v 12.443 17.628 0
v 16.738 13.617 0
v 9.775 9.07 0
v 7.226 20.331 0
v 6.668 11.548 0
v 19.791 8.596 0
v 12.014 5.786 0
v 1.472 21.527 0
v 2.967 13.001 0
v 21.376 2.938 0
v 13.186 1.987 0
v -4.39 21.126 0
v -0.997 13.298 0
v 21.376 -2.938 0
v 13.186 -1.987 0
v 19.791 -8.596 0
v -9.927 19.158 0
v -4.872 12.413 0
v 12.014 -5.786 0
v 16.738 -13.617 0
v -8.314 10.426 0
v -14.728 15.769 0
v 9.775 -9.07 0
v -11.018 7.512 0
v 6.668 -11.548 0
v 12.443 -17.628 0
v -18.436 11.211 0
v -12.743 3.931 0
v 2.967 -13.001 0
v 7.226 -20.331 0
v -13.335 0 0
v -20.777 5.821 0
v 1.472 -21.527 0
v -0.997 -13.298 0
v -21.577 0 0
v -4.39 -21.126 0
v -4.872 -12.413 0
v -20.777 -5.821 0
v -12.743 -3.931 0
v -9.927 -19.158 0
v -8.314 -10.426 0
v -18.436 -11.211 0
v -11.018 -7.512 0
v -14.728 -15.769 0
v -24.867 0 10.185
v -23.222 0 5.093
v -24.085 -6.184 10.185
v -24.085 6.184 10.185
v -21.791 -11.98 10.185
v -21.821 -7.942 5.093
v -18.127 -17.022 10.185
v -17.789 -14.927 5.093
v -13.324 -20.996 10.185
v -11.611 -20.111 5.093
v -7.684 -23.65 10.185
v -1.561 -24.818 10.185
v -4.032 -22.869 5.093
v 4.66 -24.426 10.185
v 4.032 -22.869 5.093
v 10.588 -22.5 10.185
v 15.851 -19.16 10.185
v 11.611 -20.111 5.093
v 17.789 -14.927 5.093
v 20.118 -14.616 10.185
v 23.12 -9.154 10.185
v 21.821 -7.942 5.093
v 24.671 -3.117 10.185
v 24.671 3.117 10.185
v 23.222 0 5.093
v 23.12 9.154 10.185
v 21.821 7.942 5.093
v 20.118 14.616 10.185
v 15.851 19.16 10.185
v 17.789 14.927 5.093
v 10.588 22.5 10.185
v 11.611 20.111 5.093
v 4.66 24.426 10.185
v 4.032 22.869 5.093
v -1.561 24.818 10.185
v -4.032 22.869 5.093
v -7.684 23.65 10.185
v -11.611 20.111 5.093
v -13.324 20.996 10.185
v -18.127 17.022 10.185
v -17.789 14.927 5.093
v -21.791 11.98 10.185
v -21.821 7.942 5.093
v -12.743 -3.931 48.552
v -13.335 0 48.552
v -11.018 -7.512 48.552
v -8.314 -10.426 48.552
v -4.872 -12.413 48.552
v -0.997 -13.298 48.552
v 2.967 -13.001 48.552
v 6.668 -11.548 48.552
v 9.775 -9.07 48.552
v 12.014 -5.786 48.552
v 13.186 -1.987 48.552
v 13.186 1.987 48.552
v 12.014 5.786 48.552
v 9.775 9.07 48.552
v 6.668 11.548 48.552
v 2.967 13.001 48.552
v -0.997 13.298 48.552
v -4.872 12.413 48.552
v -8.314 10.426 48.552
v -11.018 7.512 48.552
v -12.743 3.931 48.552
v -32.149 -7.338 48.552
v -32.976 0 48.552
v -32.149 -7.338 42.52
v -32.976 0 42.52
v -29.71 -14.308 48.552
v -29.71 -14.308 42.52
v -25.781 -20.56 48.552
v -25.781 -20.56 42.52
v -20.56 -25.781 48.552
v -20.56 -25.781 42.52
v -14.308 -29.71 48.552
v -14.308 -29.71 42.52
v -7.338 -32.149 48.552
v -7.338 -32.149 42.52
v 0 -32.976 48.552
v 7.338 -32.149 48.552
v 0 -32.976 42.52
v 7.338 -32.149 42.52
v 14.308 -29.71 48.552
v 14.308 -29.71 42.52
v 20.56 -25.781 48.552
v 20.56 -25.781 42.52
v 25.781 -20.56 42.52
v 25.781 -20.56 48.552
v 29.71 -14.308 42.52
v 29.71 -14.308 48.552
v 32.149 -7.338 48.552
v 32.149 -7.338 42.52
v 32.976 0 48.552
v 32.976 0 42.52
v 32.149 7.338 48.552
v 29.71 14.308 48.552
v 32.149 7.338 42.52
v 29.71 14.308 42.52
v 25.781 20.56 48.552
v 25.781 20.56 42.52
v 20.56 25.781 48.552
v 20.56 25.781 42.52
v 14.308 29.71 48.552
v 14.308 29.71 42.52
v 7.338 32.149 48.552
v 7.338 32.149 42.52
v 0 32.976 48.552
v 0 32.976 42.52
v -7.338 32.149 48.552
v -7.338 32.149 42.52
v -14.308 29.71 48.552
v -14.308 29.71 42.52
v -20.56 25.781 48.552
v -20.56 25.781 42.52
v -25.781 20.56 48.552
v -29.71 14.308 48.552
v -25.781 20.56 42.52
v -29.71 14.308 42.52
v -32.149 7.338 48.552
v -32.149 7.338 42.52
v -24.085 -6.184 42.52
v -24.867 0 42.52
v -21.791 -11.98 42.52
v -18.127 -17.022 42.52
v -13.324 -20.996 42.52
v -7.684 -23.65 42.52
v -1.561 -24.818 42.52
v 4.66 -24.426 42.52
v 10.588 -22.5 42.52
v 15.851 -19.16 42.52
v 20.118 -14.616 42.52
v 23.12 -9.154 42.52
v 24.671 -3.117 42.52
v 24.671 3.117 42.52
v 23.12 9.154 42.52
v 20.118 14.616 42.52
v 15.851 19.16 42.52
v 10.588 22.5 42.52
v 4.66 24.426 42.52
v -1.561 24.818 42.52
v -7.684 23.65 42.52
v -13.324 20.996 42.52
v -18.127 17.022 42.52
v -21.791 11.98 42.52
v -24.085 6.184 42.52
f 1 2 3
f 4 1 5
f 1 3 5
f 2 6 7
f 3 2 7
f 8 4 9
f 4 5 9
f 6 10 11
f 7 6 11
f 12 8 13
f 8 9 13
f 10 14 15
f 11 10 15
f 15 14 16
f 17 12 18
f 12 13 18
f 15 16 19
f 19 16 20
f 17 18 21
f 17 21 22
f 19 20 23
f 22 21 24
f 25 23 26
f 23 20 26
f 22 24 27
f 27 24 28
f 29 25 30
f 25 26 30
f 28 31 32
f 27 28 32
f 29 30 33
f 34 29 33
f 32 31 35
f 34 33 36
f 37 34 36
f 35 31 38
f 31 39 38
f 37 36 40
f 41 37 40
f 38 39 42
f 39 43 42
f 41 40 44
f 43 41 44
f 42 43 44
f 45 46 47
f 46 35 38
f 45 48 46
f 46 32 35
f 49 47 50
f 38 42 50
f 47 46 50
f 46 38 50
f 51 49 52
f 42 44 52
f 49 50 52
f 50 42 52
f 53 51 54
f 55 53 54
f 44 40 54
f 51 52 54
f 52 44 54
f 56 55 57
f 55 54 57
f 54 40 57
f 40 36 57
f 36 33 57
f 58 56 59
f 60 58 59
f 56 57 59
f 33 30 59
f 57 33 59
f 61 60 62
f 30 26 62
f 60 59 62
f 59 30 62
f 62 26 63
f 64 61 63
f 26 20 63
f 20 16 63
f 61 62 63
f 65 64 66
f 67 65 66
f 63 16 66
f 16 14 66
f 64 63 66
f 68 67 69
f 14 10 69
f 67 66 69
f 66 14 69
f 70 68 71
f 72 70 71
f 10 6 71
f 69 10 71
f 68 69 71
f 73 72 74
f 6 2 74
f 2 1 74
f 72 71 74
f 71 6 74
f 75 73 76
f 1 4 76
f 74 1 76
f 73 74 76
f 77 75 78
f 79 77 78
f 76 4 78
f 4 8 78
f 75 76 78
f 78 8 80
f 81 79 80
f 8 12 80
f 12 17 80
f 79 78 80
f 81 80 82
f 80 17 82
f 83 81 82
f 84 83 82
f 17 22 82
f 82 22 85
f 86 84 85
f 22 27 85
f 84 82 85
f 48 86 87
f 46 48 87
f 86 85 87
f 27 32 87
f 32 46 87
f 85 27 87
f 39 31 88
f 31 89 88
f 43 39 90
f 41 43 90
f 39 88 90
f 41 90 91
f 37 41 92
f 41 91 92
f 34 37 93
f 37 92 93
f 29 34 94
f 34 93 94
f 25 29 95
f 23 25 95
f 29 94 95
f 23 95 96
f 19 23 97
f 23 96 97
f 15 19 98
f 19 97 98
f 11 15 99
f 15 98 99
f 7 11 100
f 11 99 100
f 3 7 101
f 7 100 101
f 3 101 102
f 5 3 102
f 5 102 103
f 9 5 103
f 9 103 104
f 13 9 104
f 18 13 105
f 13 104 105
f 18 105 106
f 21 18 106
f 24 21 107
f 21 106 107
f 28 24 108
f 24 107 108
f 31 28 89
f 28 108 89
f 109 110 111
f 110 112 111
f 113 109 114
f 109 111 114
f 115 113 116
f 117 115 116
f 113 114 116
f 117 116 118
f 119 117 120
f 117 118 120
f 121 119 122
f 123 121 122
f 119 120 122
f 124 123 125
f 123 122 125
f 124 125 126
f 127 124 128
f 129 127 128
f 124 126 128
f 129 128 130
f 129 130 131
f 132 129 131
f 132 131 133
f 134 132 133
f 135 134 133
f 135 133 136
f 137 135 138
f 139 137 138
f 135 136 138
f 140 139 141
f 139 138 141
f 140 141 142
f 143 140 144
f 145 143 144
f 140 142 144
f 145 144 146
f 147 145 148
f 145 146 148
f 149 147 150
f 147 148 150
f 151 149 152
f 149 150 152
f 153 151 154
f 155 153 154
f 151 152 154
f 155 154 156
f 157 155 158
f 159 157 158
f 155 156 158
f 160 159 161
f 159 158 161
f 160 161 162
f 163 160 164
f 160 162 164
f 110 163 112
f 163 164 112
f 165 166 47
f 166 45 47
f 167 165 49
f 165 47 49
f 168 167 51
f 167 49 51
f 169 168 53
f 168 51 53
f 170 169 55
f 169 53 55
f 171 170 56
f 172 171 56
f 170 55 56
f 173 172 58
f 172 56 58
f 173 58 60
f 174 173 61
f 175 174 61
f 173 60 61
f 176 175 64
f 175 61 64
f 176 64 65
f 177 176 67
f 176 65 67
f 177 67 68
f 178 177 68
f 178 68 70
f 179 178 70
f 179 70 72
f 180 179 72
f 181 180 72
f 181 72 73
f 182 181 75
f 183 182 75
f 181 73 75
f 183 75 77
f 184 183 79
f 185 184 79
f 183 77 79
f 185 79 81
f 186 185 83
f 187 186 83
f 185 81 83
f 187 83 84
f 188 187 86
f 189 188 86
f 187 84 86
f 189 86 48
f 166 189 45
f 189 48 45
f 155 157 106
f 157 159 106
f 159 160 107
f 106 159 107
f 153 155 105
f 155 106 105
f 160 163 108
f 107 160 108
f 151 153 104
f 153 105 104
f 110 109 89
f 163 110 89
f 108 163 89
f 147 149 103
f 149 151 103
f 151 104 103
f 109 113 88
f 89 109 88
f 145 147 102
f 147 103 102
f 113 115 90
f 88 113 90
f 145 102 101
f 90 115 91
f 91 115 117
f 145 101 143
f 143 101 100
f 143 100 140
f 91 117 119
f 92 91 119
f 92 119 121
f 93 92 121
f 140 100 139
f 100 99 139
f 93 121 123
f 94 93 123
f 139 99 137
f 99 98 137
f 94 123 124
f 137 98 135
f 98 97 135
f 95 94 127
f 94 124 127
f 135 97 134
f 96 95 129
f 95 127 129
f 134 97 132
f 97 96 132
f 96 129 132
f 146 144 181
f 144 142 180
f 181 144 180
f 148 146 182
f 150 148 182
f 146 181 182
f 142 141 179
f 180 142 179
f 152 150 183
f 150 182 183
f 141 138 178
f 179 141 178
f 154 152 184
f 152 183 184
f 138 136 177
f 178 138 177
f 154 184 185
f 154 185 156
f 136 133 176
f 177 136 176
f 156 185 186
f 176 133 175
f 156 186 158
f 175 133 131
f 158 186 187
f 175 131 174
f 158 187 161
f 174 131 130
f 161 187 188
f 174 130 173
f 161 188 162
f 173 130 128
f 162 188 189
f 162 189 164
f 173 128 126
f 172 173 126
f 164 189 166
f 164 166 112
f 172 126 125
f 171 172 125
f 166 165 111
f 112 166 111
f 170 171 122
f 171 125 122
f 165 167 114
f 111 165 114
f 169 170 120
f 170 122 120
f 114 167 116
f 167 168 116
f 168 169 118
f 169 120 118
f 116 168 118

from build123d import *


# Not quite as in the source:
# - a feature names something its author has since deleted; it is built from what else it names


with BuildPart() as f1:
    # F0 (on Front) → F1 (revolve)
    with BuildSketch(Plane.XZ):
        Polygon((-13.335, 48.5521), (-32.97555, 48.5521), (-32.97555, 42.5196), (-24.8666, 42.5196), (-24.8666, 10.1854), (-21.5773, 0), (-13.335, 0), align=None)
    revolve(axis=Axis((0, 0, 24.27605), (0, 0, 1)))


solid = f1.part
